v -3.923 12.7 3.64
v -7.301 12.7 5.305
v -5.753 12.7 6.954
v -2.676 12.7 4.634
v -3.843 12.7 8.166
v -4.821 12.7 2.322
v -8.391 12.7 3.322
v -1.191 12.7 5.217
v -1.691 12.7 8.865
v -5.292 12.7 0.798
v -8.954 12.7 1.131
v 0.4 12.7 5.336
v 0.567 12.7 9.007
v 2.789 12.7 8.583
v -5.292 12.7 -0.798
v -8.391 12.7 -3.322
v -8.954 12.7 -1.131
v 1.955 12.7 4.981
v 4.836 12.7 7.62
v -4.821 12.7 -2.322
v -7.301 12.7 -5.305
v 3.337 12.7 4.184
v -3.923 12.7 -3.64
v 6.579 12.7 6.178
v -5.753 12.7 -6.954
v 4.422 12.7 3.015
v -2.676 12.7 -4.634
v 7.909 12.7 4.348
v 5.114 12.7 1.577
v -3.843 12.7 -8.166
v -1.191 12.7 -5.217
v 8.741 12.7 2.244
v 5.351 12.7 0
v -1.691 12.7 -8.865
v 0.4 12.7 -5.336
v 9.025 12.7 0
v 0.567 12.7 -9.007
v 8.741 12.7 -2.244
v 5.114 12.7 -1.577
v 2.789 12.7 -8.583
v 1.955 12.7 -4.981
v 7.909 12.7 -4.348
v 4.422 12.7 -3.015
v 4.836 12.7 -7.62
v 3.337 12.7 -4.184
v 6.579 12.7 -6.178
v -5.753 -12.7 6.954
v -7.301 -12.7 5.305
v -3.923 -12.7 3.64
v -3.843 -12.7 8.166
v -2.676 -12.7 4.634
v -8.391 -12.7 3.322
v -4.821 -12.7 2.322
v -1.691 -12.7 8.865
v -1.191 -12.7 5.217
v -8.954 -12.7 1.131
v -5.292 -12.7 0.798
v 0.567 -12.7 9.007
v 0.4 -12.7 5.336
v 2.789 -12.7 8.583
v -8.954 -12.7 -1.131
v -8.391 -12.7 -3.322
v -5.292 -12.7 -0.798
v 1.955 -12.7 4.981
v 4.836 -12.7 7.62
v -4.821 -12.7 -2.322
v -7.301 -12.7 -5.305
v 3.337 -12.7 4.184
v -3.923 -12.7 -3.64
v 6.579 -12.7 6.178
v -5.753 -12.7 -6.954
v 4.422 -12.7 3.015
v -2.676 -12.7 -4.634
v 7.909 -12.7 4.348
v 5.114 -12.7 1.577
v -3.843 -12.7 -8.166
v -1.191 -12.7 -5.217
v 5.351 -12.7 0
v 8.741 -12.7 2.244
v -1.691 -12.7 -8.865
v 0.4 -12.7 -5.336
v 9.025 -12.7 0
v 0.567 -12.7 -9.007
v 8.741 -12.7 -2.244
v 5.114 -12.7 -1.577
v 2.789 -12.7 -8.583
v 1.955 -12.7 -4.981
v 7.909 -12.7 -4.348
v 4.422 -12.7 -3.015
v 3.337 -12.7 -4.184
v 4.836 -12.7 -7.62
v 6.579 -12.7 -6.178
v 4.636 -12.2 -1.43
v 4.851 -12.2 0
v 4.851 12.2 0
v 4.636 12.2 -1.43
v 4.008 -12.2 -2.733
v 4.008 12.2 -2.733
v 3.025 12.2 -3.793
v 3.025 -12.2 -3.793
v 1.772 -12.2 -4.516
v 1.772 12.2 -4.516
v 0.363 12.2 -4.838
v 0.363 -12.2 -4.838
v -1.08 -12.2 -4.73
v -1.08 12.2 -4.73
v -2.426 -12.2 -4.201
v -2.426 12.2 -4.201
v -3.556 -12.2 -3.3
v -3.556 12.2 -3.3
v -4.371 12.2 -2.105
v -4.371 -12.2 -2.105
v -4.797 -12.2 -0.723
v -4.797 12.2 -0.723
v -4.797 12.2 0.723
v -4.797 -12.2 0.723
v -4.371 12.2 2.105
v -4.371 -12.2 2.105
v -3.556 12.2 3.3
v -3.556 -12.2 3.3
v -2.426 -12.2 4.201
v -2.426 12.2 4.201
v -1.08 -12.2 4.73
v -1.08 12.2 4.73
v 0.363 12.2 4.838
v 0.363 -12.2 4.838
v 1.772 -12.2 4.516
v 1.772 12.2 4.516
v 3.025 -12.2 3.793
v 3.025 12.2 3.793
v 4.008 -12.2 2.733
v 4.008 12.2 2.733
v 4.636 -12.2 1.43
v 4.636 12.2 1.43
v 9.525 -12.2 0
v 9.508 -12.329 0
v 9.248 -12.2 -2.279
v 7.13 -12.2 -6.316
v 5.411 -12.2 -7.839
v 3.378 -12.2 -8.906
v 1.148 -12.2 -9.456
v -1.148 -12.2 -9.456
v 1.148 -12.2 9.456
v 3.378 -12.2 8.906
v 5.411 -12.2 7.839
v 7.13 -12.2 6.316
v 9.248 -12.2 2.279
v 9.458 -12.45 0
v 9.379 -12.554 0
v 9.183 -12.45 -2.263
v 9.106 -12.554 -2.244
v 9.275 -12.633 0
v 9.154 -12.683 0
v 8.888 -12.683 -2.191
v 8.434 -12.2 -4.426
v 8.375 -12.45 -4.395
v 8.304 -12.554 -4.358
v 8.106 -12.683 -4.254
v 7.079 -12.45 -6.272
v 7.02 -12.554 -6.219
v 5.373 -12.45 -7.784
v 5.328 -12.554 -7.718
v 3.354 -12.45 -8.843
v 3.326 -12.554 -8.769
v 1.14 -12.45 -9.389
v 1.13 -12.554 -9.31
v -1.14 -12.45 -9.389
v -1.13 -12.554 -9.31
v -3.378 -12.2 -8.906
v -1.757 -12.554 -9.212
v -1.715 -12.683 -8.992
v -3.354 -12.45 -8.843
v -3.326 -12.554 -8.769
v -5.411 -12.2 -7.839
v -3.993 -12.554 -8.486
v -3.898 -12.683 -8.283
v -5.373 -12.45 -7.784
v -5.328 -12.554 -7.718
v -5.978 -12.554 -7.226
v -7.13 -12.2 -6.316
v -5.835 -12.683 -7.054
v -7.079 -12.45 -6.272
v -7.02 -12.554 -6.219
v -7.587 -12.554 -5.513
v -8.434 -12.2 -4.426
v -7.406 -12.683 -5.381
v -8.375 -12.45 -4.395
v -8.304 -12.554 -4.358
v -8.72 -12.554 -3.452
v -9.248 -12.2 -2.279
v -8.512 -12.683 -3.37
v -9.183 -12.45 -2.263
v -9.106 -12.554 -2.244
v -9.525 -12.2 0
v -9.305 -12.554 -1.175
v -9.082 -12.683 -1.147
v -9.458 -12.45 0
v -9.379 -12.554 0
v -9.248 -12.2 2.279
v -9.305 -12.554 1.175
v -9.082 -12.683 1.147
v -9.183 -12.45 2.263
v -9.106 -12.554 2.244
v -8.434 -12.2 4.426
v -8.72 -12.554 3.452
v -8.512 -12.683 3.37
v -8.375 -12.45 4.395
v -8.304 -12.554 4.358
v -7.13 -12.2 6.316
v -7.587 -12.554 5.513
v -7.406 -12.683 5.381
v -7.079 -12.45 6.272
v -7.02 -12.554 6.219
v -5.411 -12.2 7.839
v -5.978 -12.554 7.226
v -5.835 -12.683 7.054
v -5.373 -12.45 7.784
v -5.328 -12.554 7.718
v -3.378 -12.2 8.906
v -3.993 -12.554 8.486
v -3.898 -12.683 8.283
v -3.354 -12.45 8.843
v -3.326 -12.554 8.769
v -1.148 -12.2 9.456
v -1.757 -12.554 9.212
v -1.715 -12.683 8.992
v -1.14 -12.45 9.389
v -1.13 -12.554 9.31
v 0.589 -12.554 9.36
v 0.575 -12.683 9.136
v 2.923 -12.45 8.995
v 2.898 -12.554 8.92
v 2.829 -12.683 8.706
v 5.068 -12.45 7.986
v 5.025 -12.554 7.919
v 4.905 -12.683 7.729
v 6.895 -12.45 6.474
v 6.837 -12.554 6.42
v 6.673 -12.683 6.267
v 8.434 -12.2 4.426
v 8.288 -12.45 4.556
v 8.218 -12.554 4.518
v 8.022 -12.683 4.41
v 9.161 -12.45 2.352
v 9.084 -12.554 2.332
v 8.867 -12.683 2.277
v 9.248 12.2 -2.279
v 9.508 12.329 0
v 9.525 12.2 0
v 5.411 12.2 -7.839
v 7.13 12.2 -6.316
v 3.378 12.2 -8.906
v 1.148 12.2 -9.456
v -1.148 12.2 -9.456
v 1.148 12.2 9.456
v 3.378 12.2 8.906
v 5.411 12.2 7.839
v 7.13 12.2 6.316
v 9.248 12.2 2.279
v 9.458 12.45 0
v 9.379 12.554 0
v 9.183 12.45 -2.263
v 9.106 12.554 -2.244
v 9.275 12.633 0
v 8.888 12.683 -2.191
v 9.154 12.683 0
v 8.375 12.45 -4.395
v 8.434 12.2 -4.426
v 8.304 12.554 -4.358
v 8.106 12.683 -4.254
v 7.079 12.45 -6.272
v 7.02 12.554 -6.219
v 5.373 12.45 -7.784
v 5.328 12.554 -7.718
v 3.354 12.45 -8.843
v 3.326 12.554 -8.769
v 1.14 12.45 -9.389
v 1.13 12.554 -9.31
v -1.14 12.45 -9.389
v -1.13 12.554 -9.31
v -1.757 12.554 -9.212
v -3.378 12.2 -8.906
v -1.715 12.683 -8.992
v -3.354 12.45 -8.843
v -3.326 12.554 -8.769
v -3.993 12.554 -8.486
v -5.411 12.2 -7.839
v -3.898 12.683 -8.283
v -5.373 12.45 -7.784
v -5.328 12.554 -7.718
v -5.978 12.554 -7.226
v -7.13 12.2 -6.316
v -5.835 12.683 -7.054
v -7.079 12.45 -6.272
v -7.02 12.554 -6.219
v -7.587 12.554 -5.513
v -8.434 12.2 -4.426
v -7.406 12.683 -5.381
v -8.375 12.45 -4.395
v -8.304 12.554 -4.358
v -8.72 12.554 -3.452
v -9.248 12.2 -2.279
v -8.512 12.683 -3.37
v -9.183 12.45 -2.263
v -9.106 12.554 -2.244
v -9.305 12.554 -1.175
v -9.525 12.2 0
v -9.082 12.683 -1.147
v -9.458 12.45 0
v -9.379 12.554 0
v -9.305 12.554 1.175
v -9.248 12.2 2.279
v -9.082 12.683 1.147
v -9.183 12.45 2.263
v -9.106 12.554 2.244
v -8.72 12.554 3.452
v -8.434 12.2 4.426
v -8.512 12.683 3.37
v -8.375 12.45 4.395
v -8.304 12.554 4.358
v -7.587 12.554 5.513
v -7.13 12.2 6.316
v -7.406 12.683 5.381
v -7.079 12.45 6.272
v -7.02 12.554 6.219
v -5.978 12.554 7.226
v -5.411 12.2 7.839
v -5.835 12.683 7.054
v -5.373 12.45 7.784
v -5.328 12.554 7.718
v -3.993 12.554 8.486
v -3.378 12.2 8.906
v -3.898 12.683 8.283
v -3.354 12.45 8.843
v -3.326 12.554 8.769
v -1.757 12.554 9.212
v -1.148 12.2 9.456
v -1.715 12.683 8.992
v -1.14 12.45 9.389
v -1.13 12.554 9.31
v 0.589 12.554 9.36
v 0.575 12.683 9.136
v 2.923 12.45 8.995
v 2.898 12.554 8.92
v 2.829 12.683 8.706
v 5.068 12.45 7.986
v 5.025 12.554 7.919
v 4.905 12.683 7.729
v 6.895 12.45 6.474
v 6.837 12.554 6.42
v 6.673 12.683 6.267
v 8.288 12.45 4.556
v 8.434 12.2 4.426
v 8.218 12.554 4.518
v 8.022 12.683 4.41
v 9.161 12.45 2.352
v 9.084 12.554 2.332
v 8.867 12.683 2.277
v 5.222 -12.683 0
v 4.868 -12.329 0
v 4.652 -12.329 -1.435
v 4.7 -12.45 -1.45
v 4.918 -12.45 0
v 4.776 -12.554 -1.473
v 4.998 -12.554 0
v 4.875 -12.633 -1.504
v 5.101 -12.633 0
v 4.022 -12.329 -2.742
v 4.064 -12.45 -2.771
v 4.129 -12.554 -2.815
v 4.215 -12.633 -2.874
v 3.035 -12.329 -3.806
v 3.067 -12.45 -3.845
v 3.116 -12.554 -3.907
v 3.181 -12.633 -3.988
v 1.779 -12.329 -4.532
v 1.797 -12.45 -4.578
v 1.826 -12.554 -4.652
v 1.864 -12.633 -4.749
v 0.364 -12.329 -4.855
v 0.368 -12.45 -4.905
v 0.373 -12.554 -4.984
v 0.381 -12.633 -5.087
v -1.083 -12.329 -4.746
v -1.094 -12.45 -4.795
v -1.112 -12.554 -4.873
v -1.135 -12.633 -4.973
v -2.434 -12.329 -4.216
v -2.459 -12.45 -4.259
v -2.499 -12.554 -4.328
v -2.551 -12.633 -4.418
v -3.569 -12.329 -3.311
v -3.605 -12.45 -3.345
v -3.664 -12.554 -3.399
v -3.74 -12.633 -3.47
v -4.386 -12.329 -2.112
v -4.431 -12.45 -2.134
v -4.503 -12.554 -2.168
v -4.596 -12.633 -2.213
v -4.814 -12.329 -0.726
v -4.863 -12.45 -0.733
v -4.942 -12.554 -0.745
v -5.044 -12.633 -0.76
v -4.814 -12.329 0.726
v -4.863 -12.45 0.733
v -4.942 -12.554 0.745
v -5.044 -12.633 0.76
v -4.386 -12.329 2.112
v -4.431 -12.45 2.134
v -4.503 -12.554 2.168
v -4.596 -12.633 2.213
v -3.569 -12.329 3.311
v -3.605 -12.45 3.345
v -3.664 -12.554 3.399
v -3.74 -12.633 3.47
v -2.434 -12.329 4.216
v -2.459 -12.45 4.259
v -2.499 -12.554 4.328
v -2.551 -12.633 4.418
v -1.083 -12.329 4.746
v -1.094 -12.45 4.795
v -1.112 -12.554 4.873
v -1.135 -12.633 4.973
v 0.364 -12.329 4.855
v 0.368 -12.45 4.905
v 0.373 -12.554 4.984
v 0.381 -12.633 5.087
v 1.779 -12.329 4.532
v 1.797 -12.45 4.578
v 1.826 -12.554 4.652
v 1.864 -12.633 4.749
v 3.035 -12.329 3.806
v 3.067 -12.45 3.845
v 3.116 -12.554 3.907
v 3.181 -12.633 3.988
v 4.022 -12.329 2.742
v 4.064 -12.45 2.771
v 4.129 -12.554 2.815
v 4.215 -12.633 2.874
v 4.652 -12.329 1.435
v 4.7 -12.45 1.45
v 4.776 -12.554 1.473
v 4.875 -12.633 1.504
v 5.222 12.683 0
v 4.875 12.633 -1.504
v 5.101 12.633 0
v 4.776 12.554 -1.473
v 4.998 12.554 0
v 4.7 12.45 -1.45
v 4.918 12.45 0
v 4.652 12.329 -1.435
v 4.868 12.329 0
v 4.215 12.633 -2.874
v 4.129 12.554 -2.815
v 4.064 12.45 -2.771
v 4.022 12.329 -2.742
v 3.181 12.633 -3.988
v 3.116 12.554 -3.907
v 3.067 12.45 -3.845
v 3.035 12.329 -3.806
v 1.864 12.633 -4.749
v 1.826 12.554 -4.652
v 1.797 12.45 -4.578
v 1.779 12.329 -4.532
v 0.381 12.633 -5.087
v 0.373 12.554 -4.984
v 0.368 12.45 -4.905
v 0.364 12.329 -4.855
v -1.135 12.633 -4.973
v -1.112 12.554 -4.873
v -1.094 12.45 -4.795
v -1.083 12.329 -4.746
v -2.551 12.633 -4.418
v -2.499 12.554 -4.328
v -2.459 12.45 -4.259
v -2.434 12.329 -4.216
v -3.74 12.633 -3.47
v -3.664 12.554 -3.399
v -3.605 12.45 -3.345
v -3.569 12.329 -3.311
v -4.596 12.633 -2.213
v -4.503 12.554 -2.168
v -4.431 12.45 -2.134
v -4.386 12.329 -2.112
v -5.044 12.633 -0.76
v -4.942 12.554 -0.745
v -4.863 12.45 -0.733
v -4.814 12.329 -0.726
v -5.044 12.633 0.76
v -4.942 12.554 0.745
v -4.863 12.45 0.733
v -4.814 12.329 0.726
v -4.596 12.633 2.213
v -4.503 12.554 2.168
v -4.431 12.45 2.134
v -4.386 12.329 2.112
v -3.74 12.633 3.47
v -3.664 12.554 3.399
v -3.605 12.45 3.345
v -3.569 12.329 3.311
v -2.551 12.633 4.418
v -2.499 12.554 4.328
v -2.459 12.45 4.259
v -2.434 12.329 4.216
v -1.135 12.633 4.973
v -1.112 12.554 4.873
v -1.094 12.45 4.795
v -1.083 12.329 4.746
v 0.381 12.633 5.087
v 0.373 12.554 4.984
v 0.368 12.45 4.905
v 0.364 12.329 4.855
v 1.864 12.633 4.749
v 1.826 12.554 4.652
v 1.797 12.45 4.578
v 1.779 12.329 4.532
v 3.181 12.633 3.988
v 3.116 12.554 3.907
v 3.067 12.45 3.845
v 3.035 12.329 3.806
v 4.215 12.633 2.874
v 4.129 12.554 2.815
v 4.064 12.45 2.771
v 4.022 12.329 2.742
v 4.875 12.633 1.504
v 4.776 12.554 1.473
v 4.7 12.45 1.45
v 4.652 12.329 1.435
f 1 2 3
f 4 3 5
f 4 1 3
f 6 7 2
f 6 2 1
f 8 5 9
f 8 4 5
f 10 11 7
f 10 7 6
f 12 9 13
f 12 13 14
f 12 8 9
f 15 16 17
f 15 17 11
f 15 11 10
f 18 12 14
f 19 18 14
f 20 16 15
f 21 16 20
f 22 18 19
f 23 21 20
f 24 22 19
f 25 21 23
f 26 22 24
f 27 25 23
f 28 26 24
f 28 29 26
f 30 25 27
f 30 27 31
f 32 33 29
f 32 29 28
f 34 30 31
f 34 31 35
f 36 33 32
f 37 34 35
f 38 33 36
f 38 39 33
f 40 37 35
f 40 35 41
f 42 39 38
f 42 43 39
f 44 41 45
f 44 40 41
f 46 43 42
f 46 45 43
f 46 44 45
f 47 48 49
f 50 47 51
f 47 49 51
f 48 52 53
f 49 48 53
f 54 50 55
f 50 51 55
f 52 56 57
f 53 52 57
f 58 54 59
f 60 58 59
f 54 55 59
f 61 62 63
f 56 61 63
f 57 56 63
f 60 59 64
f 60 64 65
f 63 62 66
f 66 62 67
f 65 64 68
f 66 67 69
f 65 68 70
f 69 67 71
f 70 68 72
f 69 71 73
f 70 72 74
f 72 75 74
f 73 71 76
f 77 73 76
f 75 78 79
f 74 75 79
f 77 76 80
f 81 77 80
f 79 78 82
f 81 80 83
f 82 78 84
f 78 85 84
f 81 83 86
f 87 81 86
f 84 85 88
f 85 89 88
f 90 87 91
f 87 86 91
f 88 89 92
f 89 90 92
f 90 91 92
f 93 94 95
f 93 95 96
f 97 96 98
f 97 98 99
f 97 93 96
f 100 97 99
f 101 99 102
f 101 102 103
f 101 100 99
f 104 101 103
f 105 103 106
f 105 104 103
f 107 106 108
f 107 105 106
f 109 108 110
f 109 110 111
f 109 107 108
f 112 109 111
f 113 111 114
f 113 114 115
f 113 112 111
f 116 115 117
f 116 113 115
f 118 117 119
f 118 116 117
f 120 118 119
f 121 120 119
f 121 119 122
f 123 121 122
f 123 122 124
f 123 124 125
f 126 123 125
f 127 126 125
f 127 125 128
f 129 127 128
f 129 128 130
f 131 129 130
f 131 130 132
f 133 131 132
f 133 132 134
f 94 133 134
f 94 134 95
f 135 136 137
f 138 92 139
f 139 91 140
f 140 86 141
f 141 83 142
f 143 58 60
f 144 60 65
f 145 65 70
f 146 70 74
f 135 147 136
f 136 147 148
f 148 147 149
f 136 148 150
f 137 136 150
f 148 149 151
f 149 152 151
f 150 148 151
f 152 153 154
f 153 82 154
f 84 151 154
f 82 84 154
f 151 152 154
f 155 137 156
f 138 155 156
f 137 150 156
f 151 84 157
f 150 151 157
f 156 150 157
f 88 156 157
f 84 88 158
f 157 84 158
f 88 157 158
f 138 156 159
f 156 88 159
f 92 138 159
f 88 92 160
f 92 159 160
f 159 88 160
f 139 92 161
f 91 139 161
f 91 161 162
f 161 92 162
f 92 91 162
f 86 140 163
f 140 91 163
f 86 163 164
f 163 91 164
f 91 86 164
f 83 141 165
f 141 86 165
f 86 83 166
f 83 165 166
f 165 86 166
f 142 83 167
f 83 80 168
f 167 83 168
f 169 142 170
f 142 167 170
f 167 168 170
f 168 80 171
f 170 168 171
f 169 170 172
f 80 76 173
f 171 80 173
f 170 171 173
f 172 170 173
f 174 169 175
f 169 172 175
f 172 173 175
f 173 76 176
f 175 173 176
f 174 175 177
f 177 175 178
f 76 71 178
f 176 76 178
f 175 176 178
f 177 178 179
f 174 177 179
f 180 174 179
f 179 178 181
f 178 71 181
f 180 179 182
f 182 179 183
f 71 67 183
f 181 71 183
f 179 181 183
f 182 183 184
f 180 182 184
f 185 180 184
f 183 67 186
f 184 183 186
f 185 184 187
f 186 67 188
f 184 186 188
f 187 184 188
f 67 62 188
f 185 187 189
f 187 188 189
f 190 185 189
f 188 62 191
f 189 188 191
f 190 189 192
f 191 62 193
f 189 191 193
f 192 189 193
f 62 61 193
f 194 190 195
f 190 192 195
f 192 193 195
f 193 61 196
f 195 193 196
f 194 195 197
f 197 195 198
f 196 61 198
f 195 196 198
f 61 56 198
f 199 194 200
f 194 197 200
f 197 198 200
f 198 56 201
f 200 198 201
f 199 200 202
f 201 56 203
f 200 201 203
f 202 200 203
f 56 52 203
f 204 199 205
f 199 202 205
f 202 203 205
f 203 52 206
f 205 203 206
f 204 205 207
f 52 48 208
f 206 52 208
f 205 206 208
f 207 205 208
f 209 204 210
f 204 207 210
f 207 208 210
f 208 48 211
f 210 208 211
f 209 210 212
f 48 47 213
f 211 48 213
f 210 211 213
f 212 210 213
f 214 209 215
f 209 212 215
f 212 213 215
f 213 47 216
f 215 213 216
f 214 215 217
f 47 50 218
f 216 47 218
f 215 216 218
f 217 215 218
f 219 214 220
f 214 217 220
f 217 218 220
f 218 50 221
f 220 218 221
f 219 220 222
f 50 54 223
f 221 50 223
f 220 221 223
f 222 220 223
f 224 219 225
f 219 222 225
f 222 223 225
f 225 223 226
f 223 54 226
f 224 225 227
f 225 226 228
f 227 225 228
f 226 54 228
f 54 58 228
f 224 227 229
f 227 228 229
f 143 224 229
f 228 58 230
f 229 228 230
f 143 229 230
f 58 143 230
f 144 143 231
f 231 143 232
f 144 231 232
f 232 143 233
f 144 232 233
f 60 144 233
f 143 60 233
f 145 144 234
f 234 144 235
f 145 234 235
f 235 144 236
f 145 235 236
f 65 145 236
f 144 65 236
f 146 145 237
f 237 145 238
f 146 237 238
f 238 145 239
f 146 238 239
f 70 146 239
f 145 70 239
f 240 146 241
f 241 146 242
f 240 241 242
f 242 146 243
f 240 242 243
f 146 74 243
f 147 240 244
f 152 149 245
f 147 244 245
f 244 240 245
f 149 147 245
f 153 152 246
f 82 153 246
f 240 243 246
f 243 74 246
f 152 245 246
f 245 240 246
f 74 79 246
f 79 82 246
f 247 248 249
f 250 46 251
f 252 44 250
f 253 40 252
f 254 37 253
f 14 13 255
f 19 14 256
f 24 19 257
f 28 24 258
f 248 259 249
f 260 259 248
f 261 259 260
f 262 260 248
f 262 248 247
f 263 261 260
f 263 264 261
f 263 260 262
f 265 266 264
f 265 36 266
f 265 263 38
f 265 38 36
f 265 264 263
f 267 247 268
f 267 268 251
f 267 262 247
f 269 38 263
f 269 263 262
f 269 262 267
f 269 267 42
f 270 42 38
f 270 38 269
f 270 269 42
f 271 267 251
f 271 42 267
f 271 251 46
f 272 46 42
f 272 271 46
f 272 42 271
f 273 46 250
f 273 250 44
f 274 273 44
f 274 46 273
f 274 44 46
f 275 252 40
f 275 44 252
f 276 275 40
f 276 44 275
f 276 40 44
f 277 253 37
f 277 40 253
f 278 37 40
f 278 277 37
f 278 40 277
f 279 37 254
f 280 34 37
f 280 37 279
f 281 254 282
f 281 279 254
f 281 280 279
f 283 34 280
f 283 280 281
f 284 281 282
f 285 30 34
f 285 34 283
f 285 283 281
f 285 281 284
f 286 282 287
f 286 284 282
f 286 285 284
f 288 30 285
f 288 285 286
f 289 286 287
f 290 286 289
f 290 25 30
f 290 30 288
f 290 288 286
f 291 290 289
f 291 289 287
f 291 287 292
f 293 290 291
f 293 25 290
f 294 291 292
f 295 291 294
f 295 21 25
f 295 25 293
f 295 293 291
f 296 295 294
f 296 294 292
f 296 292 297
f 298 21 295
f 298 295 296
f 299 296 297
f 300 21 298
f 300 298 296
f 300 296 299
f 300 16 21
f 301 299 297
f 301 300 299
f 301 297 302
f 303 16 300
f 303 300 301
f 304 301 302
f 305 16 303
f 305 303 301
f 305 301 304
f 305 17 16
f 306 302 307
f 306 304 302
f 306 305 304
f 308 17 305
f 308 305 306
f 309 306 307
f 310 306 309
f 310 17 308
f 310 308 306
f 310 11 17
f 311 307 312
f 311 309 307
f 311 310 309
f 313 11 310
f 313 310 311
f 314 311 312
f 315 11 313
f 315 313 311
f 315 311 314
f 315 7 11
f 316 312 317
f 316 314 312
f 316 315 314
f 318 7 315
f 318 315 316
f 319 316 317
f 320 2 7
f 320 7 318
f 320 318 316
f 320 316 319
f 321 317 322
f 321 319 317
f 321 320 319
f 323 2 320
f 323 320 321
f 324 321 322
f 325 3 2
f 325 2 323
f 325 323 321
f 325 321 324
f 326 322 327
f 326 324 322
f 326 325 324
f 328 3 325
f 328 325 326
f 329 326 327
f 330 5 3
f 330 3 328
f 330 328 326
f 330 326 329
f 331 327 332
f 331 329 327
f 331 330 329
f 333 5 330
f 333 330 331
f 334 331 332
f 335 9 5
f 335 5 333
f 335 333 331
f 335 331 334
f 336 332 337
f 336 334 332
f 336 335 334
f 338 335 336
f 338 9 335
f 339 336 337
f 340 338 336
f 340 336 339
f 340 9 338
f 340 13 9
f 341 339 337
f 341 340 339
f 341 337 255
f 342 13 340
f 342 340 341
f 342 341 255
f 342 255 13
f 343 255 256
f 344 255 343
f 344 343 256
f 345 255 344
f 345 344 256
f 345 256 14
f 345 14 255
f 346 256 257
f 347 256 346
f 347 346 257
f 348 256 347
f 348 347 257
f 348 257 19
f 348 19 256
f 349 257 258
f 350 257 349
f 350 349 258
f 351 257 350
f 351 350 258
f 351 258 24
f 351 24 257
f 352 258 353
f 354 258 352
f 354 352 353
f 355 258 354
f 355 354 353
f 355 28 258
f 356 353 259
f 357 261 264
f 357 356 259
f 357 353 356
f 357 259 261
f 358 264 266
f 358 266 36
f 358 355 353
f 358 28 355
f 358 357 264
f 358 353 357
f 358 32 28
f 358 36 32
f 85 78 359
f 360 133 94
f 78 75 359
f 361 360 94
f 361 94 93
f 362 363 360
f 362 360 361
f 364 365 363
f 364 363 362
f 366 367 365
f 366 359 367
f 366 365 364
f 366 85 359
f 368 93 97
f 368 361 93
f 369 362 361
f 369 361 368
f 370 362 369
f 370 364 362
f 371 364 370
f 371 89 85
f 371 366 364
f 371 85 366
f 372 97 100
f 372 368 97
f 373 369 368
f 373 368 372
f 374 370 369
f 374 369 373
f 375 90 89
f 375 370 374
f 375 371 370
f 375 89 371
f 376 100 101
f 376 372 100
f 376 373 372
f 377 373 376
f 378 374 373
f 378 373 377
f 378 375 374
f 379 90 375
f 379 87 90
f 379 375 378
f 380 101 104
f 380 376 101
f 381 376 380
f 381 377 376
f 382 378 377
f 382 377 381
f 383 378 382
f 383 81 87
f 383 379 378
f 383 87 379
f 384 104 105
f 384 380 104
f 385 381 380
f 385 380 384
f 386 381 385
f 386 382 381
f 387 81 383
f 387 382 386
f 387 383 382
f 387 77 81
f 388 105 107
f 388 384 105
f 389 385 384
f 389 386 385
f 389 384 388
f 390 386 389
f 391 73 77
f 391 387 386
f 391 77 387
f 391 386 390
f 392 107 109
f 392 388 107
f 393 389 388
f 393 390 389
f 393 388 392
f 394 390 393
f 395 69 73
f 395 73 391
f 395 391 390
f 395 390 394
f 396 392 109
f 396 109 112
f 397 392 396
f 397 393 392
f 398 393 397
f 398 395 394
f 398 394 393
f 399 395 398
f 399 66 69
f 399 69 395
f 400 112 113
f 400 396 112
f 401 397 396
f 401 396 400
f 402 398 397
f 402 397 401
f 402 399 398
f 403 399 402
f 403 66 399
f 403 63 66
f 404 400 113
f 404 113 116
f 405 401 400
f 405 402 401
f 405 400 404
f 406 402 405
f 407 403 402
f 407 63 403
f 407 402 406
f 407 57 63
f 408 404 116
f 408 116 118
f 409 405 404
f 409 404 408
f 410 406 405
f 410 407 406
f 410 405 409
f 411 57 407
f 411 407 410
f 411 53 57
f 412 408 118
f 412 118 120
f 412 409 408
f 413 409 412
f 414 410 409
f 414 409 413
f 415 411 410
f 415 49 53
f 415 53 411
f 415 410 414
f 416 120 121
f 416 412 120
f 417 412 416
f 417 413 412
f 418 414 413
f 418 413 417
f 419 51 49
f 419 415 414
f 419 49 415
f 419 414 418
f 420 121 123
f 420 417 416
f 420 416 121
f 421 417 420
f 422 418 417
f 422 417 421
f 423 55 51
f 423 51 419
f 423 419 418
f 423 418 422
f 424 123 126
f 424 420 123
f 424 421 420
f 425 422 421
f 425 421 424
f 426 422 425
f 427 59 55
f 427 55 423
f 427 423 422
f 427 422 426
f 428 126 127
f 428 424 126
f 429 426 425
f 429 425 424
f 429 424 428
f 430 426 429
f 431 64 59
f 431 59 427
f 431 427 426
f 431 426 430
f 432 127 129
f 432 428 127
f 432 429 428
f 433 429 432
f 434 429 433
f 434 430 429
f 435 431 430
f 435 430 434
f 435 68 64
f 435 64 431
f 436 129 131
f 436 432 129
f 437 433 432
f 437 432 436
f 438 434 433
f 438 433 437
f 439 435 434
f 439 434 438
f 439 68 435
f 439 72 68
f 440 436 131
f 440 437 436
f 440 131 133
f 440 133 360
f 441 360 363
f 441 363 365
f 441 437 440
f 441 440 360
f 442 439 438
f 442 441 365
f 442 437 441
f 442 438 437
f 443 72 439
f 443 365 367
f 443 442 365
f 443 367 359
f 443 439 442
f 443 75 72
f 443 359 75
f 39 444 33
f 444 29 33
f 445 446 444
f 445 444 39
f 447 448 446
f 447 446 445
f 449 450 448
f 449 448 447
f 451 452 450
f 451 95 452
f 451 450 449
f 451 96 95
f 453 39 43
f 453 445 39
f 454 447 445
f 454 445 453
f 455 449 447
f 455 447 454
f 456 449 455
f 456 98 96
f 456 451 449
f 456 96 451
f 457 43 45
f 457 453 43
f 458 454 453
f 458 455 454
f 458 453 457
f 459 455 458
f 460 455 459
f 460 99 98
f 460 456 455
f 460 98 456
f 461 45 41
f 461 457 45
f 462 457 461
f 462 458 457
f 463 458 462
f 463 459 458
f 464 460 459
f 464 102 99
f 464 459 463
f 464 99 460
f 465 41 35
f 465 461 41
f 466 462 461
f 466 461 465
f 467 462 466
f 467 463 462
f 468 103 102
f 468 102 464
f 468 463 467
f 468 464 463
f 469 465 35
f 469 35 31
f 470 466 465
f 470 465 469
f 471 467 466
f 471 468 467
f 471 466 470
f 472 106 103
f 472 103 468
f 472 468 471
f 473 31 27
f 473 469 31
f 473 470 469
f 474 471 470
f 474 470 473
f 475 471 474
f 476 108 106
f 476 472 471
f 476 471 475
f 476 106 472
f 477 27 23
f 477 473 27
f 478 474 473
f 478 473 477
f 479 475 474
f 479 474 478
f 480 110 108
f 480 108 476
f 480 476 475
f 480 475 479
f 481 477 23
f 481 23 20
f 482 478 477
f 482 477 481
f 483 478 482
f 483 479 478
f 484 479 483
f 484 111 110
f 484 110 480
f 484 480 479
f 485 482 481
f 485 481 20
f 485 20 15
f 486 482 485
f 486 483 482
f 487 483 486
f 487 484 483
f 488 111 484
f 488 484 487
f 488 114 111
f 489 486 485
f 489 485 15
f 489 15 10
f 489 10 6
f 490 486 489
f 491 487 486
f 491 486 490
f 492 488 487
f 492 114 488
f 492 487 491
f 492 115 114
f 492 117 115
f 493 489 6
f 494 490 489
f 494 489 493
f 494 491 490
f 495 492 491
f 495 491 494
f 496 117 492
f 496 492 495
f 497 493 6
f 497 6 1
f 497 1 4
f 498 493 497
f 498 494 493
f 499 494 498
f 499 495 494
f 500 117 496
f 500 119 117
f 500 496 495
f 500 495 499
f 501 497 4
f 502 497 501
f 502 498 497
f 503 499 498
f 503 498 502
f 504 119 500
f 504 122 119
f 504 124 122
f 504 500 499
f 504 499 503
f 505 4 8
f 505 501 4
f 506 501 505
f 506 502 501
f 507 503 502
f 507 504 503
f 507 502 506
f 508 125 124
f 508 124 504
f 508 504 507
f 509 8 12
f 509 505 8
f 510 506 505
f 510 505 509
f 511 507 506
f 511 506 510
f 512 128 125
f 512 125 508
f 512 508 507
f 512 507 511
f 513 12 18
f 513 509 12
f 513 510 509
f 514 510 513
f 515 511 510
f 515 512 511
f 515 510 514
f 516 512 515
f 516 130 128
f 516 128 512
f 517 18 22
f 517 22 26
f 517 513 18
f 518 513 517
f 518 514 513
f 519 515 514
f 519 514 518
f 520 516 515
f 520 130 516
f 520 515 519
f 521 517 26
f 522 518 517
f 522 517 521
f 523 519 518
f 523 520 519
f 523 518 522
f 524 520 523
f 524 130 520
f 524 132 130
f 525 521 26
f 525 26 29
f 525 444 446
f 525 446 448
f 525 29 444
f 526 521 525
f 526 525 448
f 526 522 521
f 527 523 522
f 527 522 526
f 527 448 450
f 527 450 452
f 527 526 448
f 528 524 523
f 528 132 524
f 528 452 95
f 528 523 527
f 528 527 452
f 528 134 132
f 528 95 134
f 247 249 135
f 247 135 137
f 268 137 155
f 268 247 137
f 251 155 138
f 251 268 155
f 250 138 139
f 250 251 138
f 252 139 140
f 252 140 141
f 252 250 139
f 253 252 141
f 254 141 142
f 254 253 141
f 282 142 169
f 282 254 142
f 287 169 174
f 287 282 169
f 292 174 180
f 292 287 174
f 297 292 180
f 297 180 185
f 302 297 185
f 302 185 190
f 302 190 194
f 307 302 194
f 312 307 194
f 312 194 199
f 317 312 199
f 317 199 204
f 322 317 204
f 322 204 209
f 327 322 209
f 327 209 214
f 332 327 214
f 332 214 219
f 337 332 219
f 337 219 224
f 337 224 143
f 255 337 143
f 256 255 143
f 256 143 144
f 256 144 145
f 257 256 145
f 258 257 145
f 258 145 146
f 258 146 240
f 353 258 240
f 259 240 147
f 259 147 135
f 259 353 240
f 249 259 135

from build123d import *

# Parameters (mm, degrees)
ESQUISSE2_R        = 9.525
ESQUISSE2_R_2      = 4.8514
BOSS_EXTRU_1_DEPTH = 12.7
CONG_2_R           = 0.5


with BuildPart() as part:
    # Esquisse2 → Boss.-Extru.1 (new body, symmetric)
    with BuildSketch(Plane(origin=(0, 0, 0), x_dir=(1, 0, 0), z_dir=(0, 1, 0))):
        Circle(ESQUISSE2_R)
        Circle(ESQUISSE2_R_2, mode=Mode.SUBTRACT)
    extrude(amount=BOSS_EXTRU_1_DEPTH, both=True)

    # Congé2
    cong_2_edges = [part.edges().sort_by_distance(p)[0] for p in [
        (-9.525, -12.7, 0),
        (-9.525, 12.7, 0),
        (-4.8514, -12.7, 0),
        (-4.8514, 12.7, 0),
    ]]
    fillet(cong_2_edges, radius=CONG_2_R)


solid = part.part
